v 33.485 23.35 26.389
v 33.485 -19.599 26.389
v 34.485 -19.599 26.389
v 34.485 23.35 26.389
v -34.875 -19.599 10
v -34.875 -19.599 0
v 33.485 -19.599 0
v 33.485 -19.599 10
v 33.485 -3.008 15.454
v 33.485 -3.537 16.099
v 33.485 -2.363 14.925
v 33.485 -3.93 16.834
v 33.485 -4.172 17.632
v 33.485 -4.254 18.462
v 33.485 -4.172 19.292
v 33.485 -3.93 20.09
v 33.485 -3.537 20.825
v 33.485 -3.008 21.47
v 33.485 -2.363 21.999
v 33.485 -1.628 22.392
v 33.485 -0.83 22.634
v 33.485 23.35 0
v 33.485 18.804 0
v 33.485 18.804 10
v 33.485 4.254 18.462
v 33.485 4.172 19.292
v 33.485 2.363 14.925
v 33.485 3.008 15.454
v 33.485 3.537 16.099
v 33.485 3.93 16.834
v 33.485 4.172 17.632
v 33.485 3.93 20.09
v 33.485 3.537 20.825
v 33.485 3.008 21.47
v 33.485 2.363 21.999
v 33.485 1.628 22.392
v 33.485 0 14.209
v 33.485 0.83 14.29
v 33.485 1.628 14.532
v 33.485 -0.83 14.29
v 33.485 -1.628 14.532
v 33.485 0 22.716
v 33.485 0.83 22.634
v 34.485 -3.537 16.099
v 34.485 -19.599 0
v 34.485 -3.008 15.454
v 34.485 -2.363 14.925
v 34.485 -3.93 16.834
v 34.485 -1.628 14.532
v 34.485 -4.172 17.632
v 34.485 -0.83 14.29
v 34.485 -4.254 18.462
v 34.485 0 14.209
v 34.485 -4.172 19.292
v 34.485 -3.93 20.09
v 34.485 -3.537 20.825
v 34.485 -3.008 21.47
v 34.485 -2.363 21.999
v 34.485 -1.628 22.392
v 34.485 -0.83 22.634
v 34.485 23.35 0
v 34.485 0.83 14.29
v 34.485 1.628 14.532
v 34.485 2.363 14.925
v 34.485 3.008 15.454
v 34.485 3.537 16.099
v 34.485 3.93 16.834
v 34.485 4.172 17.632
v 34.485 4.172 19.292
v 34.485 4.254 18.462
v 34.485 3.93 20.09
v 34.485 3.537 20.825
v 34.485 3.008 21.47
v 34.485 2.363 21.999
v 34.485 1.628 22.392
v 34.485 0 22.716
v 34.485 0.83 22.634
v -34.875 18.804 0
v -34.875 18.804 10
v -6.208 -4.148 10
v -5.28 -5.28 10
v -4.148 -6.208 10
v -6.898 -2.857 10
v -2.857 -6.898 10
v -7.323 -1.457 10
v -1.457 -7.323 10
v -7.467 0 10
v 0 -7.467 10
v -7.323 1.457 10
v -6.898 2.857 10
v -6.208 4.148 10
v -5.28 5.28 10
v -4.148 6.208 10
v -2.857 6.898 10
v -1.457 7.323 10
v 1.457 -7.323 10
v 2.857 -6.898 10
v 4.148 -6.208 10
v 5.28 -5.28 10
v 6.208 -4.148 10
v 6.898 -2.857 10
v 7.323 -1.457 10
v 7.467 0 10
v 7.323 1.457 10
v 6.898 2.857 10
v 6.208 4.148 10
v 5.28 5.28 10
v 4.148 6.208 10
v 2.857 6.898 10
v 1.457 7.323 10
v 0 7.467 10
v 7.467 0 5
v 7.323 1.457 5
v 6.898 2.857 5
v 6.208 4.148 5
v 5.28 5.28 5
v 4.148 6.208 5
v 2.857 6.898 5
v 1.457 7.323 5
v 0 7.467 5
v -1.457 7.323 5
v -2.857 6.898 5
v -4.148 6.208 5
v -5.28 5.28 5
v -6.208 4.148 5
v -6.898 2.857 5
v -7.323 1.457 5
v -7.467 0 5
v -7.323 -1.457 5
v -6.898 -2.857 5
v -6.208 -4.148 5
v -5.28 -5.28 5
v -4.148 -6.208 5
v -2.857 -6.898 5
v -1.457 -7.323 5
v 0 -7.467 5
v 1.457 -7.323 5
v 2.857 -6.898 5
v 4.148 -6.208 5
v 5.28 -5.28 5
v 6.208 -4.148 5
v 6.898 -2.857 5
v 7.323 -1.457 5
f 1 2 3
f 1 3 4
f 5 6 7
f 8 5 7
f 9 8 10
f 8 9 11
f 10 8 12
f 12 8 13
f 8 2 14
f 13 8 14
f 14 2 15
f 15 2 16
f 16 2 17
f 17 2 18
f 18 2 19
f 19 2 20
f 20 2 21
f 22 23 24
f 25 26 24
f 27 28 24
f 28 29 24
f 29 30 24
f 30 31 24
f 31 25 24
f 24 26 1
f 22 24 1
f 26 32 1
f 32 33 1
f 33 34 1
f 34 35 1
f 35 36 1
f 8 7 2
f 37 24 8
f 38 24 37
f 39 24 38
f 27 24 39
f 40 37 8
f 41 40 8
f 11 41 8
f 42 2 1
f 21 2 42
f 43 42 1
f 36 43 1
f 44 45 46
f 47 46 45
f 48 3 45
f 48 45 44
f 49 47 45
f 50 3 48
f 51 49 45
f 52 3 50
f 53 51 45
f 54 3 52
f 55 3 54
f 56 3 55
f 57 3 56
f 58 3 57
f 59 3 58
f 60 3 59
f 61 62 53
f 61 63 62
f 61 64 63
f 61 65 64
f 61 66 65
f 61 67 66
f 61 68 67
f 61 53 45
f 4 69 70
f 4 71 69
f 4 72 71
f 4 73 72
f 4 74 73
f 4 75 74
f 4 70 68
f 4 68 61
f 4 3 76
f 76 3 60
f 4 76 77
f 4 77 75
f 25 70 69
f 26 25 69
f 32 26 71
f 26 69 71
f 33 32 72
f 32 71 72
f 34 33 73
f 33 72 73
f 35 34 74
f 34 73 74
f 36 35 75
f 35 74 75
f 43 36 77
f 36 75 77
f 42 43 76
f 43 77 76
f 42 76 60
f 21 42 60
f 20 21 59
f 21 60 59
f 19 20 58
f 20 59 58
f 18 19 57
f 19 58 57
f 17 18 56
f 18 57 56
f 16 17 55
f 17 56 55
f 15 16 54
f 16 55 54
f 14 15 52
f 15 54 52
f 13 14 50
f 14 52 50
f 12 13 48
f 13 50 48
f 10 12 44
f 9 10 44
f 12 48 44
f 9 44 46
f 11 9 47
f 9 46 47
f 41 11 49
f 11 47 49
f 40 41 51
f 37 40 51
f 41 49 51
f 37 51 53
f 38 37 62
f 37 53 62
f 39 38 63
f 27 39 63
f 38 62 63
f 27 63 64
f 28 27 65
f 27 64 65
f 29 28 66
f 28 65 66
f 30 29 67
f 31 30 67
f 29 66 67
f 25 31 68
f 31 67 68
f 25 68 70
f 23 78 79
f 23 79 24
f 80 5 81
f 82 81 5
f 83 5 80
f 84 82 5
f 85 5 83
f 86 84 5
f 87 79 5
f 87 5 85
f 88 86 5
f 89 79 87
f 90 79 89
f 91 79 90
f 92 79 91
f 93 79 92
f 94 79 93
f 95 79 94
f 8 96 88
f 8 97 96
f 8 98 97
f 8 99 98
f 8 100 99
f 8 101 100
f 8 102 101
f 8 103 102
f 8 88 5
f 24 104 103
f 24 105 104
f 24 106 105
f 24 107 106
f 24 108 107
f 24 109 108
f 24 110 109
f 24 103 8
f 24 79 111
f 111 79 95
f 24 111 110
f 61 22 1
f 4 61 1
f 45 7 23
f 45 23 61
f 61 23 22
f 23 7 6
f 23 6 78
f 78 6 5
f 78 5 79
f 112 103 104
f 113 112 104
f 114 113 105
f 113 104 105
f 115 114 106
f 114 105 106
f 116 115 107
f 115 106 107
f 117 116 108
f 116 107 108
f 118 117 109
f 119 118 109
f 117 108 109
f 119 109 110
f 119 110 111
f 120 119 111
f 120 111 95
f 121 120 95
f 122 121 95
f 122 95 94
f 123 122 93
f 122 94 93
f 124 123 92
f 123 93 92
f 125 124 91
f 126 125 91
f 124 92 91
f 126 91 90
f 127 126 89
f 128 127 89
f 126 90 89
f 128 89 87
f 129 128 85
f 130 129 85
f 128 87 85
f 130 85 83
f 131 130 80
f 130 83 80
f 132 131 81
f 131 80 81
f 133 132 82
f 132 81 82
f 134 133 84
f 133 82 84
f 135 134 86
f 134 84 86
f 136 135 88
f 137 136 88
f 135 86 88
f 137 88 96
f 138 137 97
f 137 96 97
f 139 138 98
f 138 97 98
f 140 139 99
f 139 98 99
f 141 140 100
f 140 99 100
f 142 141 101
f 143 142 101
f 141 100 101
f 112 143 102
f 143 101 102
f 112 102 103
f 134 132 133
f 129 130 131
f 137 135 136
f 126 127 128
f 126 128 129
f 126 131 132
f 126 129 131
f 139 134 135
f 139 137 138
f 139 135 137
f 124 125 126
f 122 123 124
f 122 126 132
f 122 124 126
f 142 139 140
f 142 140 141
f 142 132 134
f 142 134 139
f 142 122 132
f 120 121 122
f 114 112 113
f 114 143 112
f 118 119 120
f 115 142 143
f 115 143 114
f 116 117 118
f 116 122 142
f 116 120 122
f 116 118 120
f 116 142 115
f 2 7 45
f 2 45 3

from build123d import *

# Parameters (mm, degrees)
F0_W     = 68.36
F0_H     = 38.402704
F1_DEPTH = 10
F2_R     = 7.466851
F3_DEPTH = 5
F4_W     = 42.948617
F4_H     = 26.389016
F5_DEPTH = 1
F6_R     = 4.253524
F7_DEPTH = 1


with BuildPart() as f1:
    # F0 (on Top) → F1 (new body)
    with BuildSketch(Plane.XY):
        with Locations((-0.695145, -0.397226)):
            Rectangle(F0_W, F0_H)
    extrude(amount=F1_DEPTH)

    # F2 (on face) → F3 (cut)
    with BuildSketch(Plane.XY.offset(10)):
        Circle(F2_R)
    extrude(amount=-F3_DEPTH, mode=Mode.SUBTRACT)

    # F4 (on face) → F5 (join)
    with BuildSketch(Plane.YZ.offset(33.484855)):
        with Locations((1.87573, 13.194508)):
            Rectangle(F4_W, F4_H)
    extrude(amount=F5_DEPTH)

    # F6 (on face) → F7 (cut)
    with BuildSketch(Plane.YZ.offset(34.484855)):
        with Locations((0, 18.462041)):
            Circle(F6_R)
    extrude(amount=-F7_DEPTH, mode=Mode.SUBTRACT)


solid = f1.part
